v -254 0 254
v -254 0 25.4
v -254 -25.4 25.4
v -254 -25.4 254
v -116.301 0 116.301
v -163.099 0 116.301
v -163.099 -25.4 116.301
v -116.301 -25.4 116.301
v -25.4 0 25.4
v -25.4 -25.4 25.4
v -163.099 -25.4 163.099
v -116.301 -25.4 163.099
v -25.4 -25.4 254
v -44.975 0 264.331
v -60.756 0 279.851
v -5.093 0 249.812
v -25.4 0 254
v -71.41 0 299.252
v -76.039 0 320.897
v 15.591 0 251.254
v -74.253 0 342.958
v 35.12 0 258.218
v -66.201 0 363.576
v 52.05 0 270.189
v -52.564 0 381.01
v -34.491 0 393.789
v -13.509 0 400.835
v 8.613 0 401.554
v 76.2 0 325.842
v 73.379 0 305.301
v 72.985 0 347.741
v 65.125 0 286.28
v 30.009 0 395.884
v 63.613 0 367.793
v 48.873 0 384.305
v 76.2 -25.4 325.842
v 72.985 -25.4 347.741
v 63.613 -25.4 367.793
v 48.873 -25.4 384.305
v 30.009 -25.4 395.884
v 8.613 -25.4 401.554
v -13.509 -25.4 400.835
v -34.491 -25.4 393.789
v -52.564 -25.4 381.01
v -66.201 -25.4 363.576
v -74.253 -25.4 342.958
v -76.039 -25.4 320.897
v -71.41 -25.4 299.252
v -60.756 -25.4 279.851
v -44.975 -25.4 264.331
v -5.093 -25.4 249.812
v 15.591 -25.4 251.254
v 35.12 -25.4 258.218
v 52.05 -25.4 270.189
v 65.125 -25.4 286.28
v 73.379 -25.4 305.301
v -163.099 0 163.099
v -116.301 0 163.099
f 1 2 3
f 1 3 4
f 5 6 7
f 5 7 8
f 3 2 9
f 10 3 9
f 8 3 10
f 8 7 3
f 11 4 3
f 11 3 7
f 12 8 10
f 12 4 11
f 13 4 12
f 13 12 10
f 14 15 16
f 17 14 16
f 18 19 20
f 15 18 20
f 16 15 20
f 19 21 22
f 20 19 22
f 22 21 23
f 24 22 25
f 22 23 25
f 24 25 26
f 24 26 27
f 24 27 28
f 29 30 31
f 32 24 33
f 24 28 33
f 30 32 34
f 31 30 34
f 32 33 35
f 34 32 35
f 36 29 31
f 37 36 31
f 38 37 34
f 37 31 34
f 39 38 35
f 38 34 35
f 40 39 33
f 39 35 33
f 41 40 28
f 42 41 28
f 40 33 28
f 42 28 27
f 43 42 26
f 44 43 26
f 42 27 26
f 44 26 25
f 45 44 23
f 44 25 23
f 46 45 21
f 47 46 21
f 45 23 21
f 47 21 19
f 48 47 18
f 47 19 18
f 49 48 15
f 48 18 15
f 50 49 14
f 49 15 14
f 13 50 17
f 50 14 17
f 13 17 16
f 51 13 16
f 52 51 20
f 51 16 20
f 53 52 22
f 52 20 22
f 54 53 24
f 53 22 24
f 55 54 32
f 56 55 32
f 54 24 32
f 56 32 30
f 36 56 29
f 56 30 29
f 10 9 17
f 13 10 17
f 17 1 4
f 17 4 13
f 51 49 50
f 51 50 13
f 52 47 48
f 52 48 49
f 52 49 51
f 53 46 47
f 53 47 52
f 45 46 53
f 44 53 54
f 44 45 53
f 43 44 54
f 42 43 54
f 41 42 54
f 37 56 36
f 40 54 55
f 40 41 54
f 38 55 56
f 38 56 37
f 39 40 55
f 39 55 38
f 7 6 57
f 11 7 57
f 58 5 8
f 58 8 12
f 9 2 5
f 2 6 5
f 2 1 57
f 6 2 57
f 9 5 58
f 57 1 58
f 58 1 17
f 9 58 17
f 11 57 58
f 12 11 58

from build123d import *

# Parameters (mm, degrees)
F0_W     = 228.6
F0_H     = 228.6
F0_W_2   = 46.7980969906
F0_H_2   = 46.7980969906
F1_DEPTH = 25.4


with BuildPart() as f1:
    # F0 (on Front) → F1 (new body)
    with BuildSketch(Plane.XZ):
        with Locations((-139.7, 139.7)):
            Rectangle(F0_W, F0_H)
        with Locations((-139.7, 139.7)):
            Rectangle(F0_W_2, F0_H_2, mode=Mode.SUBTRACT)
    extrude(amount=F1_DEPTH)


with BuildPart() as f1b:
    # F0 (on Front) → F1, piece 2 (new body)
    with BuildSketch(Plane.XZ):
        with BuildLine():
            ThreePointArc((76.2, 325.8420489686), (-43.9940905122, 388.0590884352), (-25.4, 254))
            ThreePointArc((-25.4, 254), (43.9940905122, 263.6250095019), (76.2, 325.8420489686))
        make_face()
    extrude(amount=F1_DEPTH)


solid = Compound([f1.part, f1b.part])
